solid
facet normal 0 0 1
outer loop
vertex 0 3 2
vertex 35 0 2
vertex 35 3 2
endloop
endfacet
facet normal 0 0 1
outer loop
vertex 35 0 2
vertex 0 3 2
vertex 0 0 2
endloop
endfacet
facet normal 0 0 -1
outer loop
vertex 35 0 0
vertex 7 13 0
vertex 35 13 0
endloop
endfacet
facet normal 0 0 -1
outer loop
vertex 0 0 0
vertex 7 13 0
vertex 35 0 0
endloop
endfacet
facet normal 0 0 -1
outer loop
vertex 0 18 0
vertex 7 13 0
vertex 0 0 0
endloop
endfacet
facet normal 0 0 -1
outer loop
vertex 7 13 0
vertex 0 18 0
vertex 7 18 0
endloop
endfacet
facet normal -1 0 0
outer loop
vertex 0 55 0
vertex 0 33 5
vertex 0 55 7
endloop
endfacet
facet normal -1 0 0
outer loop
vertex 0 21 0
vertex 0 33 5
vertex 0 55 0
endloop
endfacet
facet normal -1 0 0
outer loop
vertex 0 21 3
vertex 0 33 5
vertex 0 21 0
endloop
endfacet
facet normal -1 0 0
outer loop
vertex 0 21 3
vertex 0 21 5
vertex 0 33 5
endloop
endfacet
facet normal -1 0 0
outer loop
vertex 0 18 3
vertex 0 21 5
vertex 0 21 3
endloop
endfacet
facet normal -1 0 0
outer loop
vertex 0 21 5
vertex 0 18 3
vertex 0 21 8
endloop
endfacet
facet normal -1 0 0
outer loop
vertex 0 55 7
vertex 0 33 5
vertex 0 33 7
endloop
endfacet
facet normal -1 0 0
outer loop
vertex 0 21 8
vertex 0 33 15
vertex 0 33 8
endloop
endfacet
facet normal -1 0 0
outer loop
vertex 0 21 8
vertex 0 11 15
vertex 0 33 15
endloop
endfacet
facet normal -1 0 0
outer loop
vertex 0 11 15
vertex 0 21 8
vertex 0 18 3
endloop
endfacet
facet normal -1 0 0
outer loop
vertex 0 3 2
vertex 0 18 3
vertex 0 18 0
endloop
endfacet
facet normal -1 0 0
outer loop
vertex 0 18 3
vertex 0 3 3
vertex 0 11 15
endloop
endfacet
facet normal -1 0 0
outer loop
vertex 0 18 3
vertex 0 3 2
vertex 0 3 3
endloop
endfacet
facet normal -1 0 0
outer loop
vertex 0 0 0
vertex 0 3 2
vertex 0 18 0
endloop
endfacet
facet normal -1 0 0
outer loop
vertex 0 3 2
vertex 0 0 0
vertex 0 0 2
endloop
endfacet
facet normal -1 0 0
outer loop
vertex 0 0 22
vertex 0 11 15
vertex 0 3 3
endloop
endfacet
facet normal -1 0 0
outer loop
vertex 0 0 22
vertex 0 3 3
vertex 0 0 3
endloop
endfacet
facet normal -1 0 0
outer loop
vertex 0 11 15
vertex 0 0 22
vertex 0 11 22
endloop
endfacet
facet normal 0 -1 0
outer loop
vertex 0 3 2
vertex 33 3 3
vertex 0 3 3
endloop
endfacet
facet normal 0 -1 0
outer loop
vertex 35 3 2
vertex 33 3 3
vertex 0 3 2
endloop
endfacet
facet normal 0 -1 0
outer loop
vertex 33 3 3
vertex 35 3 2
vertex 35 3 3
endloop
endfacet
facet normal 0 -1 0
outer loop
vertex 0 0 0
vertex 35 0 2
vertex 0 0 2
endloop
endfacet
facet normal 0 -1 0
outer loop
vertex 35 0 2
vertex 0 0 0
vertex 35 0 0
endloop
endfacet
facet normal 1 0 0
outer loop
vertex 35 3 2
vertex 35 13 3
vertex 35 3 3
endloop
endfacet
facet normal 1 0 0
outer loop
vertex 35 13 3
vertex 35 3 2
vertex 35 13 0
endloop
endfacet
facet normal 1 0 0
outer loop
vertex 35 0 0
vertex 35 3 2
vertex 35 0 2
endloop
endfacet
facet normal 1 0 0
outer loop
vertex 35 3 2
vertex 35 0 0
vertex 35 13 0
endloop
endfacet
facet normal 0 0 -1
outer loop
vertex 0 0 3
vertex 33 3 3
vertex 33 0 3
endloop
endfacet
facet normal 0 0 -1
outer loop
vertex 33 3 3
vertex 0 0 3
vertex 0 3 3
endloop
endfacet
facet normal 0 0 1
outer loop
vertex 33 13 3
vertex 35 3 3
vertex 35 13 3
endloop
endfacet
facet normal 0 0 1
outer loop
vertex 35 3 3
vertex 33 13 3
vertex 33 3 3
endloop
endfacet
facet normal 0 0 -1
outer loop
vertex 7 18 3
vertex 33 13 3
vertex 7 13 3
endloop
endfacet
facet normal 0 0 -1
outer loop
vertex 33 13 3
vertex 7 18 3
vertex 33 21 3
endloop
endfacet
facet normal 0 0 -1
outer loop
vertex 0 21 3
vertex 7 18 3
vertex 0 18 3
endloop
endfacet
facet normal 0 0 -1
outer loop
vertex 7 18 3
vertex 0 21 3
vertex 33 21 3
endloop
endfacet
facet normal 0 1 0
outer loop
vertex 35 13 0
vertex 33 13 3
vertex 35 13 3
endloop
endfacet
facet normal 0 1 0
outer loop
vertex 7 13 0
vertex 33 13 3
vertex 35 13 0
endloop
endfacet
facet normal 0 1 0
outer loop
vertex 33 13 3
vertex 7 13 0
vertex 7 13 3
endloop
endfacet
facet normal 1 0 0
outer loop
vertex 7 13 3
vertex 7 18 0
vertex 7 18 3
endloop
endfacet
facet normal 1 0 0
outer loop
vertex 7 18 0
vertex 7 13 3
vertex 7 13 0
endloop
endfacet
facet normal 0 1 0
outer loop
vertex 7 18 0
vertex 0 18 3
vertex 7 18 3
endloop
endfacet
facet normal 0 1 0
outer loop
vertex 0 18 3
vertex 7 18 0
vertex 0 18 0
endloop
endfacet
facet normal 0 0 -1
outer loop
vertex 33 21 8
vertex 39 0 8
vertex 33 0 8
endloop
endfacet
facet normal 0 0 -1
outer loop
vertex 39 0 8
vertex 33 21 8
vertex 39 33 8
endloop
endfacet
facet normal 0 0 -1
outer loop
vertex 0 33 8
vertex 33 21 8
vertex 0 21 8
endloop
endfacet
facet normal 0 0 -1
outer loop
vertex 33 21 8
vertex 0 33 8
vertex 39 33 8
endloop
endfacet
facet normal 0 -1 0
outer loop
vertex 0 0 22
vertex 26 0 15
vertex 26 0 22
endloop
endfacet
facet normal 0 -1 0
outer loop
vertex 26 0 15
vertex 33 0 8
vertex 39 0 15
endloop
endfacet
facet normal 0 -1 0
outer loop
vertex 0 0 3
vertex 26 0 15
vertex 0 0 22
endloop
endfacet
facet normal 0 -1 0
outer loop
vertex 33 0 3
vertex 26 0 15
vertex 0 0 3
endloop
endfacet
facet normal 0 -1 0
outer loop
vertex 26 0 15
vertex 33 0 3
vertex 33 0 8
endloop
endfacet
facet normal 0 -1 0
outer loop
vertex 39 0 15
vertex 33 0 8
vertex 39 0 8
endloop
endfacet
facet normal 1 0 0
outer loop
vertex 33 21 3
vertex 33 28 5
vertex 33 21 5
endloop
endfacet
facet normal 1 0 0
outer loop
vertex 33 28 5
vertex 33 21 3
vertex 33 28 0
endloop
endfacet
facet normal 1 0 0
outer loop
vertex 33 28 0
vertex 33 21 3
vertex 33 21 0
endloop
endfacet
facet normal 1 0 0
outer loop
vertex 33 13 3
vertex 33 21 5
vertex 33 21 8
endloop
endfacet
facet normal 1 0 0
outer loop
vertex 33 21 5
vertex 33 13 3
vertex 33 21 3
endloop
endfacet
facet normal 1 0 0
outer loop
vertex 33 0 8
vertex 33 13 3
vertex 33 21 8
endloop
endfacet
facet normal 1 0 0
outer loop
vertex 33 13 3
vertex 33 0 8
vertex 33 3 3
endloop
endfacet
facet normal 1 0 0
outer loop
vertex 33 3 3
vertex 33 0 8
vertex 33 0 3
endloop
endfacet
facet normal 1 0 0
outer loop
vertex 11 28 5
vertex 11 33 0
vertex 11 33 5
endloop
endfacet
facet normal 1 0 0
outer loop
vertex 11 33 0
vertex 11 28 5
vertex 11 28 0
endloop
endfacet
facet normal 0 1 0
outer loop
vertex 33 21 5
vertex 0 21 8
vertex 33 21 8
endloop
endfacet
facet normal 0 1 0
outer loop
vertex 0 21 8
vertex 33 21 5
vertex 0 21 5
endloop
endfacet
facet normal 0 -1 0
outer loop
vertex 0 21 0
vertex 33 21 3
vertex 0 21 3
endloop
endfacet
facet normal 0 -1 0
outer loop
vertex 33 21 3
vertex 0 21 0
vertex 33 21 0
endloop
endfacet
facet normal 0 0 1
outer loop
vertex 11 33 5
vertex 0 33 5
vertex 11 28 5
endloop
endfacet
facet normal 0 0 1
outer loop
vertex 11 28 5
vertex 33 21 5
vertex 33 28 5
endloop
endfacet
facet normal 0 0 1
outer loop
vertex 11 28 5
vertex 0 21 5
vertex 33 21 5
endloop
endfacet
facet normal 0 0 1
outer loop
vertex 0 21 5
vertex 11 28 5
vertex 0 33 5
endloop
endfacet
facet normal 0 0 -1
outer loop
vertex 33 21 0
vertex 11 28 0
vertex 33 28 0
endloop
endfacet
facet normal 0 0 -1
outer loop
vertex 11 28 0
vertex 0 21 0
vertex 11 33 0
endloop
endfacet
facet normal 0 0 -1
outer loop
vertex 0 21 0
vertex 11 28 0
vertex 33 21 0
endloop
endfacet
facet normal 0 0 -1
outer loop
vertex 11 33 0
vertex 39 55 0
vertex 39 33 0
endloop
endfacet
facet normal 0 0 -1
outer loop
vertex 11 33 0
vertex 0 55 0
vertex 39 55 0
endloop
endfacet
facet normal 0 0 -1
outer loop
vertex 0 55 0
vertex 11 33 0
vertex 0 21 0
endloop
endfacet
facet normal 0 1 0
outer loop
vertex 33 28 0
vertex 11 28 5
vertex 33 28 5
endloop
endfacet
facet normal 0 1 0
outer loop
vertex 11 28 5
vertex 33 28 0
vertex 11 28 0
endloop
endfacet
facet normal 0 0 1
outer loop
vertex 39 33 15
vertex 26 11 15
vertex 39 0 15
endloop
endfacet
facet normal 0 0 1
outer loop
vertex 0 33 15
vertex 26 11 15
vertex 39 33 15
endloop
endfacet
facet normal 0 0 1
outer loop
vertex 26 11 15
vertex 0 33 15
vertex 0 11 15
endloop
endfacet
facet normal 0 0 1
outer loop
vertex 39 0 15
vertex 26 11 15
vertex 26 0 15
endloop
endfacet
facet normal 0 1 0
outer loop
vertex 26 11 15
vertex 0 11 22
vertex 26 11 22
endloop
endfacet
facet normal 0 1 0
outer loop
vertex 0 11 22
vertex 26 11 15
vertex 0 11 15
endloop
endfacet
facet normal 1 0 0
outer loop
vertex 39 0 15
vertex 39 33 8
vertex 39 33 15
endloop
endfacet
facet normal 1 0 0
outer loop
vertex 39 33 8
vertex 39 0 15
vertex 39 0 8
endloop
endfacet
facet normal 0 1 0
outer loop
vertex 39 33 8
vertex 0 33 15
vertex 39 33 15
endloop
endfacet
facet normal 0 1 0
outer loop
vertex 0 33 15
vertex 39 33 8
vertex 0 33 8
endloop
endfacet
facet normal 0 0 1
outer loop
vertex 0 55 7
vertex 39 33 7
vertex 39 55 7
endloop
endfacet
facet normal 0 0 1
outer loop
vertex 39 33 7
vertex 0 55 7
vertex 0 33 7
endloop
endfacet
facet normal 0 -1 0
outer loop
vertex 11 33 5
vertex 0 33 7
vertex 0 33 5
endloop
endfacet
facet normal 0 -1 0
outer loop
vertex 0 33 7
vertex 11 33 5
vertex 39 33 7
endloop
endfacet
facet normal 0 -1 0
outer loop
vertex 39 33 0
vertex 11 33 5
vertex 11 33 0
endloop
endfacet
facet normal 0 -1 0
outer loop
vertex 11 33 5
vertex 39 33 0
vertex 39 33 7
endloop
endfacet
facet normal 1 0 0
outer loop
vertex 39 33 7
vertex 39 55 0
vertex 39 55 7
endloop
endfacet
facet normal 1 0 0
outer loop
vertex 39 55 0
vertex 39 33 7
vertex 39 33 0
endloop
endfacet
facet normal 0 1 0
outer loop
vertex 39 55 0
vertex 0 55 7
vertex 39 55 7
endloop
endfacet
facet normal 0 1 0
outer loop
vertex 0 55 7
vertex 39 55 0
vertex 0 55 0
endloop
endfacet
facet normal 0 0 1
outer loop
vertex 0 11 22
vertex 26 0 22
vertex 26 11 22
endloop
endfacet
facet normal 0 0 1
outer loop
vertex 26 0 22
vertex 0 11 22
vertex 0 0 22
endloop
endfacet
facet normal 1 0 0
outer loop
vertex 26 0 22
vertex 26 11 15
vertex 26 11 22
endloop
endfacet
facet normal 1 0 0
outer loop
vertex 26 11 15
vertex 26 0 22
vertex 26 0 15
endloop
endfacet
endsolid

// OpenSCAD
translate([2.5, 1.5, 1.0]) color([0.8842528530898255, 0.2134665283608419, 0.6127566924478359]) cube([5, 3, 2], center=true);
translate([7.5, 1.5, 1.0]) color([0.818008657000479, 0.5590112191053322, 0.8866043301622452]) cube([5, 3, 2], center=true);
translate([12.5, 1.5, 1.0]) color([0.39447102725022787, 0.9589163376419946, 0.24972819156954773]) cube([5, 3, 2], center=true);
translate([17.5, 1.5, 1.0]) color([0.22005049979750413, 0.8404590105346786, 0.2789960200671917]) cube([5, 3, 2], center=true);
translate([22.5, 1.5, 1.0]) color([0.35210354864297055, 0.9946691500756418, 0.10728537706325991]) cube([5, 3, 2], center=true);
translate([27.5, 1.5, 1.0]) color([0.8996256313138141, 0.6100819970747507, 0.7890377134172993]) cube([5, 3, 2], center=true);
translate([32.5, 1.5, 1.0]) color([0.7110679469752405, 0.7774643558396669, 0.5140354678382717]) cube([5, 3, 2], center=true);
translate([3.5, 5.5, 1.5]) color([0.46207744282607, 0.6343562920465169, 0.27254621857246664]) cube([7, 5, 3], center=true);
translate([10.5, 5.5, 1.5]) color([0.016558424522952975, 0.6148716567717017, 0.7119066573597548]) cube([7, 5, 3], center=true);
translate([17.5, 5.5, 1.5]) color([0.17257617960039529, 0.41465974039415787, 0.21806470516739018]) cube([7, 5, 3], center=true);
translate([24.5, 5.5, 1.5]) color([0.8797884787327306, 0.9971497033508181, 0.006439244314443648]) cube([7, 5, 3], center=true);
translate([31.5, 5.5, 1.5]) color([0.5355241113549698, 0.428269623660265, 0.0497703561320445]) cube([7, 5, 3], center=true);
translate([3.5, 10.5, 1.5]) color([0.3846945959716809, 0.27248481749180187, 0.9711494351721061]) cube([7, 5, 3], center=true);
translate([10.5, 10.5, 1.5]) color([0.5646669518865992, 0.22956269737245216, 0.7165492601952248]) cube([7, 5, 3], center=true);
translate([17.5, 10.5, 1.5]) color([0.5466375027642284, 0.2821670936164109, 0.7398695784196249]) cube([7, 5, 3], center=true);
translate([24.5, 10.5, 1.5]) color([0.9015687423954613, 0.06478718309218656, 0.3075184499818515]) cube([7, 5, 3], center=true);
translate([31.5, 10.5, 1.5]) color([0.32730937178137276, 0.373196919474838, 0.48026967262350795]) cube([7, 5, 3], center=true);
translate([3.5, 15.5, 1.5]) color([0.5820603979481933, 0.1372879505883815, 0.015498761483451418]) cube([7, 5, 3], center=true);
translate([5.5, 3.5, 5.5]) color([0.5048497045627587, 0.36698725510709684, 0.6348155217266559]) cube([11, 7, 5], center=true);
translate([16.5, 3.5, 5.5]) color([0.811995686067811, 0.8768405645756486, 0.1552431358080847]) cube([11, 7, 5], center=true);
translate([27.5, 3.5, 5.5]) color([0.1767648869043179, 0.991228648099722, 0.13558077637136434]) cube([11, 7, 5], center=true);
translate([5.5, 10.5, 5.5]) color([0.20650423900368708, 0.9151210693627757, 0.49673738754911745]) cube([11, 7, 5], center=true);
translate([16.5, 10.5, 5.5]) color([0.7672539256192649, 0.969306850533619, 0.23531586477578126]) cube([11, 7, 5], center=true);
translate([27.5, 10.5, 5.5]) color([0.13212860983739783, 0.23368957459901674, 0.38460662479298113]) cube([11, 7, 5], center=true);
translate([5.5, 17.5, 5.5]) color([0.6084990843462054, 0.1325407149567407, 0.4984659545183915]) cube([11, 7, 5], center=true);
translate([16.5, 17.5, 5.5]) color([0.9178662904203972, 0.6160167741323543, 0.02601445858505036]) cube([11, 7, 5], center=true);
translate([27.5, 17.5, 5.5]) color([0.596125612844632, 0.48919913512172475, 0.30869925031539414]) cube([11, 7, 5], center=true);
translate([5.5, 24.5, 2.5]) color([0.9586301909392594, 0.5555224541780607, 0.16303723797834868]) cube([11, 7, 5], center=true);
translate([16.5, 24.5, 2.5]) color([0.8790785483620981, 0.8092366229990562, 0.7373715302416316]) cube([11, 7, 5], center=true);
translate([27.5, 24.5, 2.5]) color([0.5460288399006699, 0.7042240787132147, 0.07877233817546292]) cube([11, 7, 5], center=true);
translate([5.5, 31.5, 2.5]) color([0.13744427713979768, 0.40185422229333856, 0.1910666288561843]) cube([11, 7, 5], center=true);
translate([6.5, 5.5, 11.5]) color([0.31642065037316636, 0.2917281417853558, 0.9437754009602987]) cube([13, 11, 7], center=true);
translate([19.5, 5.5, 11.5]) color([0.20866341172373193, 0.3151573145870893, 0.7470721078045024]) cube([13, 11, 7], center=true);
translate([6.5, 16.5, 11.5]) color([0.24960896628473228, 0.8629627260654799, 0.6684326881602258]) cube([13, 11, 7], center=true);
translate([19.5, 16.5, 11.5]) color([0.6597695027130189, 0.22591717735012307, 0.3441717078654829]) cube([13, 11, 7], center=true);
translate([32.5, 5.5, 11.5]) color([0.16233220178561225, 0.01697652307419406, 0.5735931064152219]) cube([13, 11, 7], center=true);
translate([32.5, 16.5, 11.5]) color([0.05818297514553228, 0.6304378073753134, 0.35341956482818127]) cube([13, 11, 7], center=true);
translate([6.5, 27.5, 11.5]) color([0.49110709598533775, 0.06132304686728618, 0.24146702174069912]) cube([13, 11, 7], center=true);
translate([19.5, 27.5, 11.5]) color([0.012441234482642782, 0.9455344576677447, 0.3266678829978785]) cube([13, 11, 7], center=true);
translate([32.5, 27.5, 11.5]) color([0.820956849026723, 0.34492851027915805, 0.6639756368298299]) cube([13, 11, 7], center=true);
translate([6.5, 38.5, 3.5]) color([0.13585073420724958, 0.9219835342207869, 0.44896684911260887]) cube([13, 11, 7], center=true);
translate([19.5, 38.5, 3.5]) color([0.1420549627992148, 0.3119518323014343, 0.6490756968320398]) cube([13, 11, 7], center=true);
translate([32.5, 38.5, 3.5]) color([0.7280642389267371, 0.7852833252199665, 0.40863068686923587]) cube([13, 11, 7], center=true);
translate([6.5, 49.5, 3.5]) color([0.009633238682779877, 0.8909238596539266, 0.533705581213062]) cube([13, 11, 7], center=true);
translate([19.5, 49.5, 3.5]) color([0.8046005274030336, 0.9806276909012095, 0.7049346898693578]) cube([13, 11, 7], center=true);
translate([32.5, 49.5, 3.5]) color([0.7590860206033218, 0.5647284680717275, 0.12259546226958773]) cube([13, 11, 7], center=true);
translate([6.5, 5.5, 18.5]) color([0.9539533584587191, 0.1713156178825357, 0.5005542720722199]) cube([13, 11, 7], center=true);
translate([19.5, 5.5, 18.5]) color([0.621843985236089, 0.6619765424276485, 0.8400519693824264]) cube([13, 11, 7], center=true);
